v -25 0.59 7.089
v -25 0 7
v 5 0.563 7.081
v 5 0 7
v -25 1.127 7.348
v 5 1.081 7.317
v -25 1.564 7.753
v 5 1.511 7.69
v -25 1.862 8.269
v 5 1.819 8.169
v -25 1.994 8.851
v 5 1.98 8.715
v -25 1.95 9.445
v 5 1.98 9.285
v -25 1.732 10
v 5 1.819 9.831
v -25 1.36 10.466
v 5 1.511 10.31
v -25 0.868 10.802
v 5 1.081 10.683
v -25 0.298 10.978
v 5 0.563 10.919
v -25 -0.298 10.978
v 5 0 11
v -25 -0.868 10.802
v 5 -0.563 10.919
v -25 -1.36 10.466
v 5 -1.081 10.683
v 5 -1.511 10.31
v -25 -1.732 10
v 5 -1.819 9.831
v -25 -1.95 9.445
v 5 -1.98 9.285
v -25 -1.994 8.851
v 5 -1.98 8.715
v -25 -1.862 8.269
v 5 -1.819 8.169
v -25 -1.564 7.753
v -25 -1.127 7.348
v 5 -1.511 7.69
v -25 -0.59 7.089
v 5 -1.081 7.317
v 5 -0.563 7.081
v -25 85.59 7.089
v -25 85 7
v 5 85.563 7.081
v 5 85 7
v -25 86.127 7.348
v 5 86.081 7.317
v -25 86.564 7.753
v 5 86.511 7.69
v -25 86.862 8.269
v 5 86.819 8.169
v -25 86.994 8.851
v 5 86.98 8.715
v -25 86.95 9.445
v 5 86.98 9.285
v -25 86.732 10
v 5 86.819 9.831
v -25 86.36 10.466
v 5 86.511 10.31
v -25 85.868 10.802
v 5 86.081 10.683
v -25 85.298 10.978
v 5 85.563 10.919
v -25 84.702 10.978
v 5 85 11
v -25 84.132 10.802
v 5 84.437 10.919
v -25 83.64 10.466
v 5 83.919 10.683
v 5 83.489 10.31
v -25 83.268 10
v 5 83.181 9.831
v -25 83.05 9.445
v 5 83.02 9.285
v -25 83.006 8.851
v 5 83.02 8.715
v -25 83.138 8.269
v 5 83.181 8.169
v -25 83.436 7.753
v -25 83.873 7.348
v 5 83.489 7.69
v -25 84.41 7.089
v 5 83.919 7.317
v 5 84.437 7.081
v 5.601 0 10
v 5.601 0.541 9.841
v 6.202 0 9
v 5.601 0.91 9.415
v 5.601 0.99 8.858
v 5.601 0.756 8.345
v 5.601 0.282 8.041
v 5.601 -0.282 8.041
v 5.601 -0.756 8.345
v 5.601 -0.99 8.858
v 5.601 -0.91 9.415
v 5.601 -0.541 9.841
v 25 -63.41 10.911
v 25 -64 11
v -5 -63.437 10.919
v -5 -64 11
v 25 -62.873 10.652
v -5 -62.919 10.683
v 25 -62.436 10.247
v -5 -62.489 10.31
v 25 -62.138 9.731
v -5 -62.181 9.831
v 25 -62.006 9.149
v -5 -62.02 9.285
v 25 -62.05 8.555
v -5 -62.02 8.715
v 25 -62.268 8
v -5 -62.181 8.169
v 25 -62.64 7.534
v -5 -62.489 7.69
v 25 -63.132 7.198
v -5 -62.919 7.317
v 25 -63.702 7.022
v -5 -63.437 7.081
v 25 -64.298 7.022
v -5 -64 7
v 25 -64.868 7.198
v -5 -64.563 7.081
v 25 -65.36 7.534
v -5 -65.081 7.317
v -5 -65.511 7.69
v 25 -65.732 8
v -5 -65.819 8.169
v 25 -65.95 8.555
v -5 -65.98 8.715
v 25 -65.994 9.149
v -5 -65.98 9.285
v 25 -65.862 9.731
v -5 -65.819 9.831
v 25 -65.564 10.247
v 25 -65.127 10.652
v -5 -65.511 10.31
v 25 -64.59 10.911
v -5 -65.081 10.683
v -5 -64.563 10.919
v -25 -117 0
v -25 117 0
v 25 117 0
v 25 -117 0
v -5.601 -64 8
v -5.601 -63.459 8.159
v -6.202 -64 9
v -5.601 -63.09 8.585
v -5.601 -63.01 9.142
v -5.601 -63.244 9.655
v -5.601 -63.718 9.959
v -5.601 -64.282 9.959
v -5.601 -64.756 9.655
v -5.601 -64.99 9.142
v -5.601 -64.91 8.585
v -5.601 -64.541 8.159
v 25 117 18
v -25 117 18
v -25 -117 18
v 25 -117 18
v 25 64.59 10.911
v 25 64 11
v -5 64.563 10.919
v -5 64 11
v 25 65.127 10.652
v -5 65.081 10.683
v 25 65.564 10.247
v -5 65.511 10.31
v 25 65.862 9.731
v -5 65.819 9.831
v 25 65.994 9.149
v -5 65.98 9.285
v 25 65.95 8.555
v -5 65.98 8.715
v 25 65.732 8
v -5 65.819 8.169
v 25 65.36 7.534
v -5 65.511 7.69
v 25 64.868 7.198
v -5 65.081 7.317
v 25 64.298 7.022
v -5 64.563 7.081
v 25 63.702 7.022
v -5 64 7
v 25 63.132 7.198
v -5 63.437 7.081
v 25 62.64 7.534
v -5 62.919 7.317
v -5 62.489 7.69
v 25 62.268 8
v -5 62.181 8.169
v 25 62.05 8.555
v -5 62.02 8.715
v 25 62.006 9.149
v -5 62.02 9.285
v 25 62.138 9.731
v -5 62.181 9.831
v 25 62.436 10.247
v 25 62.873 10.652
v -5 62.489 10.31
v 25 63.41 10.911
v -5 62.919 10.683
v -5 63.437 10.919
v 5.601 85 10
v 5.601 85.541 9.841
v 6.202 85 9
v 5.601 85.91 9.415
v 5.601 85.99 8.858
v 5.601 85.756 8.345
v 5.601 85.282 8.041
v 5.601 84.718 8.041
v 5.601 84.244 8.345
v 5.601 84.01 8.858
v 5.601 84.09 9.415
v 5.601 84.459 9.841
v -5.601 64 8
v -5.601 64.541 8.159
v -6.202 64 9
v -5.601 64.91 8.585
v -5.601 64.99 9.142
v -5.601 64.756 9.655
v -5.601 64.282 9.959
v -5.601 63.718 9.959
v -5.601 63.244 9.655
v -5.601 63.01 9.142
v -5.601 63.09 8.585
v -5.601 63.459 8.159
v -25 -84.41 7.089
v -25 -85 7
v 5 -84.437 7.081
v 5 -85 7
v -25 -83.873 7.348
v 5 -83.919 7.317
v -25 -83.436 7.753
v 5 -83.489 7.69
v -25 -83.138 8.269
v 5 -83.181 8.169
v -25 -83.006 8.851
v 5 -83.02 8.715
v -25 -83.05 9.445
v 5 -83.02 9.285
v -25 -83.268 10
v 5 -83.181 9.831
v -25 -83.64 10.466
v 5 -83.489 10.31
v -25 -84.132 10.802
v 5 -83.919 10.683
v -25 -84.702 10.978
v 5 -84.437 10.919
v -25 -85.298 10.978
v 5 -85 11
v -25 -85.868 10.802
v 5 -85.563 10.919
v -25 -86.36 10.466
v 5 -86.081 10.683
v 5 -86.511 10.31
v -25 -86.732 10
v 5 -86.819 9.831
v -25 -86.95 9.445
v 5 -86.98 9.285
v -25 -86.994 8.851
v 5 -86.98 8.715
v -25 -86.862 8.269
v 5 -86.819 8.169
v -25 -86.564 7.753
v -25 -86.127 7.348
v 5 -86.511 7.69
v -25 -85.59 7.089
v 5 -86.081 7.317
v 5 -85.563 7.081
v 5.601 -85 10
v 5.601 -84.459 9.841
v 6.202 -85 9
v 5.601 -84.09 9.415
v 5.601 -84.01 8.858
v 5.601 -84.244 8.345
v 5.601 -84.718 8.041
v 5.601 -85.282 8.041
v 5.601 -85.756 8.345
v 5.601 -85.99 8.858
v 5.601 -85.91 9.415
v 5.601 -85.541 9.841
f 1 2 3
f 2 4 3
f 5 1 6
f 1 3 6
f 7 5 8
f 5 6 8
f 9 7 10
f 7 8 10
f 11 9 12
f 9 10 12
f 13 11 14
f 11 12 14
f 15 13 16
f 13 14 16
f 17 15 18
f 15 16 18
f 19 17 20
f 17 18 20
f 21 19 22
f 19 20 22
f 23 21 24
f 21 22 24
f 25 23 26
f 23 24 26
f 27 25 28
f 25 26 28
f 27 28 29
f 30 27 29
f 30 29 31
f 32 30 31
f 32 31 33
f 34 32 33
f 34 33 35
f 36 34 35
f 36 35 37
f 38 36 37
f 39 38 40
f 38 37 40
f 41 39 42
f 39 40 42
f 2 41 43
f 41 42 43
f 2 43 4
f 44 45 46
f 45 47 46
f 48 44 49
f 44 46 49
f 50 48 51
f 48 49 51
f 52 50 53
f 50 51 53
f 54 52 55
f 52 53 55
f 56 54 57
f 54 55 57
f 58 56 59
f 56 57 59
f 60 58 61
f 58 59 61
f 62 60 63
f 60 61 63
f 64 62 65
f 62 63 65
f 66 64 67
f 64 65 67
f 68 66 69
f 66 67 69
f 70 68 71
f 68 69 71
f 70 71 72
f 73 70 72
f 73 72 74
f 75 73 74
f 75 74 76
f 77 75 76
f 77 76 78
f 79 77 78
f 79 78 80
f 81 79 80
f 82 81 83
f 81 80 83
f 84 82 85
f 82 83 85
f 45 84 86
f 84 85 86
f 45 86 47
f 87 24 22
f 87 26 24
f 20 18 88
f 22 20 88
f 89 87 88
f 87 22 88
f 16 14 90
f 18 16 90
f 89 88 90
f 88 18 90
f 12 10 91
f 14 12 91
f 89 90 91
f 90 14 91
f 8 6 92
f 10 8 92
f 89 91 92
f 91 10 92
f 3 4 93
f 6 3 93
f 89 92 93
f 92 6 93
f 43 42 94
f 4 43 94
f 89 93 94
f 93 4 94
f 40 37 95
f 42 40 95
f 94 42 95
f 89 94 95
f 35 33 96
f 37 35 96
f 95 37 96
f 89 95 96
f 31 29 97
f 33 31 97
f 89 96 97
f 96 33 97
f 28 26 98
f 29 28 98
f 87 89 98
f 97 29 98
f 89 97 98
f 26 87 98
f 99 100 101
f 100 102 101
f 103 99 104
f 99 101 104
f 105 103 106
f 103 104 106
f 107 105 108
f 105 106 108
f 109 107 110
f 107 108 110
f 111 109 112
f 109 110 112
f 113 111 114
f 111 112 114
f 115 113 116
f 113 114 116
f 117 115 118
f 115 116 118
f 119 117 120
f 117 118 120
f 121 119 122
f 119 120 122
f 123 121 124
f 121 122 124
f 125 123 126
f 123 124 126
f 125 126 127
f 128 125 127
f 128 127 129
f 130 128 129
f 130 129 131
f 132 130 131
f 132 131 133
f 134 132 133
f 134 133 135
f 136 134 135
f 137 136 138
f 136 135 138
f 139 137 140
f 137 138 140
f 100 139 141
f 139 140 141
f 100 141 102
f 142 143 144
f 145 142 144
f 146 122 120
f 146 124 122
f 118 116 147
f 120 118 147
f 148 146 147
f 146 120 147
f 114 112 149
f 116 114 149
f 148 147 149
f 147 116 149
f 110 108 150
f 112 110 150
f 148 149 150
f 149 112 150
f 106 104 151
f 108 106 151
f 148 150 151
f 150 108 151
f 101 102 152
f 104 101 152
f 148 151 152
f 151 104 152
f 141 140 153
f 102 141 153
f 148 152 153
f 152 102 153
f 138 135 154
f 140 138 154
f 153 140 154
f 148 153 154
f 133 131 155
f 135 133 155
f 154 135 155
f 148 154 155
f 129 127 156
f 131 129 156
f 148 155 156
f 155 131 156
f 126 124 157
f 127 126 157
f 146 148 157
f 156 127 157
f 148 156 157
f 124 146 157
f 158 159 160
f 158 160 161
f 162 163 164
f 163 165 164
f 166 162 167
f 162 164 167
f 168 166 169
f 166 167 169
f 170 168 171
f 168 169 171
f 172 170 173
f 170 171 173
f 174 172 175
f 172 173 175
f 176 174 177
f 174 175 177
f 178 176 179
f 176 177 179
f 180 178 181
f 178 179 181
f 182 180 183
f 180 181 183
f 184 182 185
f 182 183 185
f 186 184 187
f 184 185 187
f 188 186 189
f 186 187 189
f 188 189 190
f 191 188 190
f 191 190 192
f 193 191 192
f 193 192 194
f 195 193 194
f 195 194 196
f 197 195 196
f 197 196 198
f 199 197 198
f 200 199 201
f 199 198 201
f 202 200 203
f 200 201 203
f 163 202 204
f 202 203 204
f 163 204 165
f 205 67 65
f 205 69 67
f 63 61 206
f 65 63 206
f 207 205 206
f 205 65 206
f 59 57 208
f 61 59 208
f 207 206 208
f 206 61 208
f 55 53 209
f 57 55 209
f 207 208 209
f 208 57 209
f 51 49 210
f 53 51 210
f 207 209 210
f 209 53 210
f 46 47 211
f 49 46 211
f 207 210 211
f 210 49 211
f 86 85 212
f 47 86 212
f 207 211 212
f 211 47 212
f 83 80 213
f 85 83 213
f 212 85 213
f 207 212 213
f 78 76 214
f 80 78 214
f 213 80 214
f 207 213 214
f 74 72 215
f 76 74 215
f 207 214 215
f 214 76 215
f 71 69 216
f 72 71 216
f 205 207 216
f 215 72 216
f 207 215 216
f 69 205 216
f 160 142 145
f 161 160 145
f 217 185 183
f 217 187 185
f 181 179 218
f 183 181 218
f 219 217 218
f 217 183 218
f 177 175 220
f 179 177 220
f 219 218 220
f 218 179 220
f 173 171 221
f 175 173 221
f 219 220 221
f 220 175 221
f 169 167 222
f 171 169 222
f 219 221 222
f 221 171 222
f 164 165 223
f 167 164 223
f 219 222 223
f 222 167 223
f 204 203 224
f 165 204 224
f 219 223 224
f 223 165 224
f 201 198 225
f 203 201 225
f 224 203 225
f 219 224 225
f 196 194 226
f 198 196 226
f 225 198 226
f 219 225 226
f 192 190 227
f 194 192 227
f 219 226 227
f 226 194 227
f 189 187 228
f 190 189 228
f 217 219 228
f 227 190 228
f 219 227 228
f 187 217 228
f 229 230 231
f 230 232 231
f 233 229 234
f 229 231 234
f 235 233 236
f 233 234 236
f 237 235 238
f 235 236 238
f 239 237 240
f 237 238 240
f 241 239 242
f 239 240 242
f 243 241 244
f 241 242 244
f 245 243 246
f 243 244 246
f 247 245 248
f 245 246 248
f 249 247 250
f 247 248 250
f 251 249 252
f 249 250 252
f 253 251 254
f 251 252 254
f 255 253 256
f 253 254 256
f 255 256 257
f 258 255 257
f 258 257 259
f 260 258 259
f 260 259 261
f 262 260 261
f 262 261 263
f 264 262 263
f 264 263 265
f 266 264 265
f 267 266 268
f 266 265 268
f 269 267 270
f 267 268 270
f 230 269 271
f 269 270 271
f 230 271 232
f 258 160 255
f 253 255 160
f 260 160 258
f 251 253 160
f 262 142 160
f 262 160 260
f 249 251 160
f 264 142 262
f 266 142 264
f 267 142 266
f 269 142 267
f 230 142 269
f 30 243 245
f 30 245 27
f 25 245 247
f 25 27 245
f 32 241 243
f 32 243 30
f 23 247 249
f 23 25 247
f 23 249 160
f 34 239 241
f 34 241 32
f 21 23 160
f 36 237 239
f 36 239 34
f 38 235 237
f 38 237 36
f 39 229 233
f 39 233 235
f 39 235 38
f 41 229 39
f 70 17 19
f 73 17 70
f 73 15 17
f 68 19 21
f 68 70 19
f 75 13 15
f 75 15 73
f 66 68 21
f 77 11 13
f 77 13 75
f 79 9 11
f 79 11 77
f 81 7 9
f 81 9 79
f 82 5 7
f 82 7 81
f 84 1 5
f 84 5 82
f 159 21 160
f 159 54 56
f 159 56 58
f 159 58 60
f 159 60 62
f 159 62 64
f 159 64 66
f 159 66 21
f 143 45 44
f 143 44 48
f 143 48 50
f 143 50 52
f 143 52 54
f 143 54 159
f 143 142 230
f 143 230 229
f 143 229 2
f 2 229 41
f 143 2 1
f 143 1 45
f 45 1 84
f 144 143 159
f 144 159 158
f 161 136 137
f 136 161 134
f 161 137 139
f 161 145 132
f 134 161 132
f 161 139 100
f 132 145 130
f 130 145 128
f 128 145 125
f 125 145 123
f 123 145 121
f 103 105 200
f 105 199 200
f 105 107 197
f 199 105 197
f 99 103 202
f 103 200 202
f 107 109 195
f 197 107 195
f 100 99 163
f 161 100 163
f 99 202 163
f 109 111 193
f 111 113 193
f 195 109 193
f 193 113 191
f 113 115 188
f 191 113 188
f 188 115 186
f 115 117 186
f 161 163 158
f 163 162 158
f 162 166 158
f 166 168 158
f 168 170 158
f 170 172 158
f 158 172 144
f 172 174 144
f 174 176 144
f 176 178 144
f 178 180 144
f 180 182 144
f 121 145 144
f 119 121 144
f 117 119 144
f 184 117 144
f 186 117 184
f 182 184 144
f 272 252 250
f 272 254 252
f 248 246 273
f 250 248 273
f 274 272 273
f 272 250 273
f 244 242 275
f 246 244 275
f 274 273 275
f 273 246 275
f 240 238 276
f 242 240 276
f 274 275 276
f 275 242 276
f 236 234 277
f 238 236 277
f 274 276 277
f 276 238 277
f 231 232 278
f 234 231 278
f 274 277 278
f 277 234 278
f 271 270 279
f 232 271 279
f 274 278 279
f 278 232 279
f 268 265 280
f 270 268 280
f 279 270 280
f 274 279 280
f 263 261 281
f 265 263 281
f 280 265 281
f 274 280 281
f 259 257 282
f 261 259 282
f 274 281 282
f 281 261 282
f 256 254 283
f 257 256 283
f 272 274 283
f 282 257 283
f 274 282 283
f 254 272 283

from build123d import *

# Parameters (mm, degrees)
SKETCH1_W                    = 50
SKETCH1_H                    = 234
BOSS_EXTRUDE1_DEPTH          = 18
F_4_0_4_DIAMETER_HOLE2_D     = 4
F_4_0_4_DIAMETER_HOLE2_DEPTH = 30
F_4_0_4_DIAMETER_HOLE2_TIP   = 1.201721238
F_4_0_4_DIAMETER_HOLE3_D     = 4
F_4_0_4_DIAMETER_HOLE3_DEPTH = 30
F_4_0_4_DIAMETER_HOLE3_TIP   = 1.201721238


with BuildPart() as part:
    # Sketch1 → Boss-Extrude1 (new body)
    with BuildSketch(Plane.XY):
        Rectangle(SKETCH1_W, SKETCH1_H)
    extrude(amount=BOSS_EXTRUDE1_DEPTH)

    # Ø4.0 (4) Diameter Hole2
    with Locations(Plane(origin=(25, 0, 0), x_dir=(0, 0, -1), z_dir=(1, 0, 0))):
        with Locations((-9, 64), (-9, -64)):
            Hole(F_4_0_4_DIAMETER_HOLE2_D / 2, depth=F_4_0_4_DIAMETER_HOLE2_DEPTH)
            with Locations((0, 0, -(F_4_0_4_DIAMETER_HOLE2_DEPTH + F_4_0_4_DIAMETER_HOLE2_TIP / 2))):  # 118° drill point
                Cone(0, F_4_0_4_DIAMETER_HOLE2_D / 2, F_4_0_4_DIAMETER_HOLE2_TIP, mode=Mode.SUBTRACT)

    # Ø4.0 (4) Diameter Hole3
    with Locations(Plane.ZY.offset(25)):
        with Locations((9, 85), (9, 0), (9, -85)):
            Hole(F_4_0_4_DIAMETER_HOLE3_D / 2, depth=F_4_0_4_DIAMETER_HOLE3_DEPTH)
            with Locations((0, 0, -(F_4_0_4_DIAMETER_HOLE3_DEPTH + F_4_0_4_DIAMETER_HOLE3_TIP / 2))):  # 118° drill point
                Cone(0, F_4_0_4_DIAMETER_HOLE3_D / 2, F_4_0_4_DIAMETER_HOLE3_TIP, mode=Mode.SUBTRACT)


solid = part.part
